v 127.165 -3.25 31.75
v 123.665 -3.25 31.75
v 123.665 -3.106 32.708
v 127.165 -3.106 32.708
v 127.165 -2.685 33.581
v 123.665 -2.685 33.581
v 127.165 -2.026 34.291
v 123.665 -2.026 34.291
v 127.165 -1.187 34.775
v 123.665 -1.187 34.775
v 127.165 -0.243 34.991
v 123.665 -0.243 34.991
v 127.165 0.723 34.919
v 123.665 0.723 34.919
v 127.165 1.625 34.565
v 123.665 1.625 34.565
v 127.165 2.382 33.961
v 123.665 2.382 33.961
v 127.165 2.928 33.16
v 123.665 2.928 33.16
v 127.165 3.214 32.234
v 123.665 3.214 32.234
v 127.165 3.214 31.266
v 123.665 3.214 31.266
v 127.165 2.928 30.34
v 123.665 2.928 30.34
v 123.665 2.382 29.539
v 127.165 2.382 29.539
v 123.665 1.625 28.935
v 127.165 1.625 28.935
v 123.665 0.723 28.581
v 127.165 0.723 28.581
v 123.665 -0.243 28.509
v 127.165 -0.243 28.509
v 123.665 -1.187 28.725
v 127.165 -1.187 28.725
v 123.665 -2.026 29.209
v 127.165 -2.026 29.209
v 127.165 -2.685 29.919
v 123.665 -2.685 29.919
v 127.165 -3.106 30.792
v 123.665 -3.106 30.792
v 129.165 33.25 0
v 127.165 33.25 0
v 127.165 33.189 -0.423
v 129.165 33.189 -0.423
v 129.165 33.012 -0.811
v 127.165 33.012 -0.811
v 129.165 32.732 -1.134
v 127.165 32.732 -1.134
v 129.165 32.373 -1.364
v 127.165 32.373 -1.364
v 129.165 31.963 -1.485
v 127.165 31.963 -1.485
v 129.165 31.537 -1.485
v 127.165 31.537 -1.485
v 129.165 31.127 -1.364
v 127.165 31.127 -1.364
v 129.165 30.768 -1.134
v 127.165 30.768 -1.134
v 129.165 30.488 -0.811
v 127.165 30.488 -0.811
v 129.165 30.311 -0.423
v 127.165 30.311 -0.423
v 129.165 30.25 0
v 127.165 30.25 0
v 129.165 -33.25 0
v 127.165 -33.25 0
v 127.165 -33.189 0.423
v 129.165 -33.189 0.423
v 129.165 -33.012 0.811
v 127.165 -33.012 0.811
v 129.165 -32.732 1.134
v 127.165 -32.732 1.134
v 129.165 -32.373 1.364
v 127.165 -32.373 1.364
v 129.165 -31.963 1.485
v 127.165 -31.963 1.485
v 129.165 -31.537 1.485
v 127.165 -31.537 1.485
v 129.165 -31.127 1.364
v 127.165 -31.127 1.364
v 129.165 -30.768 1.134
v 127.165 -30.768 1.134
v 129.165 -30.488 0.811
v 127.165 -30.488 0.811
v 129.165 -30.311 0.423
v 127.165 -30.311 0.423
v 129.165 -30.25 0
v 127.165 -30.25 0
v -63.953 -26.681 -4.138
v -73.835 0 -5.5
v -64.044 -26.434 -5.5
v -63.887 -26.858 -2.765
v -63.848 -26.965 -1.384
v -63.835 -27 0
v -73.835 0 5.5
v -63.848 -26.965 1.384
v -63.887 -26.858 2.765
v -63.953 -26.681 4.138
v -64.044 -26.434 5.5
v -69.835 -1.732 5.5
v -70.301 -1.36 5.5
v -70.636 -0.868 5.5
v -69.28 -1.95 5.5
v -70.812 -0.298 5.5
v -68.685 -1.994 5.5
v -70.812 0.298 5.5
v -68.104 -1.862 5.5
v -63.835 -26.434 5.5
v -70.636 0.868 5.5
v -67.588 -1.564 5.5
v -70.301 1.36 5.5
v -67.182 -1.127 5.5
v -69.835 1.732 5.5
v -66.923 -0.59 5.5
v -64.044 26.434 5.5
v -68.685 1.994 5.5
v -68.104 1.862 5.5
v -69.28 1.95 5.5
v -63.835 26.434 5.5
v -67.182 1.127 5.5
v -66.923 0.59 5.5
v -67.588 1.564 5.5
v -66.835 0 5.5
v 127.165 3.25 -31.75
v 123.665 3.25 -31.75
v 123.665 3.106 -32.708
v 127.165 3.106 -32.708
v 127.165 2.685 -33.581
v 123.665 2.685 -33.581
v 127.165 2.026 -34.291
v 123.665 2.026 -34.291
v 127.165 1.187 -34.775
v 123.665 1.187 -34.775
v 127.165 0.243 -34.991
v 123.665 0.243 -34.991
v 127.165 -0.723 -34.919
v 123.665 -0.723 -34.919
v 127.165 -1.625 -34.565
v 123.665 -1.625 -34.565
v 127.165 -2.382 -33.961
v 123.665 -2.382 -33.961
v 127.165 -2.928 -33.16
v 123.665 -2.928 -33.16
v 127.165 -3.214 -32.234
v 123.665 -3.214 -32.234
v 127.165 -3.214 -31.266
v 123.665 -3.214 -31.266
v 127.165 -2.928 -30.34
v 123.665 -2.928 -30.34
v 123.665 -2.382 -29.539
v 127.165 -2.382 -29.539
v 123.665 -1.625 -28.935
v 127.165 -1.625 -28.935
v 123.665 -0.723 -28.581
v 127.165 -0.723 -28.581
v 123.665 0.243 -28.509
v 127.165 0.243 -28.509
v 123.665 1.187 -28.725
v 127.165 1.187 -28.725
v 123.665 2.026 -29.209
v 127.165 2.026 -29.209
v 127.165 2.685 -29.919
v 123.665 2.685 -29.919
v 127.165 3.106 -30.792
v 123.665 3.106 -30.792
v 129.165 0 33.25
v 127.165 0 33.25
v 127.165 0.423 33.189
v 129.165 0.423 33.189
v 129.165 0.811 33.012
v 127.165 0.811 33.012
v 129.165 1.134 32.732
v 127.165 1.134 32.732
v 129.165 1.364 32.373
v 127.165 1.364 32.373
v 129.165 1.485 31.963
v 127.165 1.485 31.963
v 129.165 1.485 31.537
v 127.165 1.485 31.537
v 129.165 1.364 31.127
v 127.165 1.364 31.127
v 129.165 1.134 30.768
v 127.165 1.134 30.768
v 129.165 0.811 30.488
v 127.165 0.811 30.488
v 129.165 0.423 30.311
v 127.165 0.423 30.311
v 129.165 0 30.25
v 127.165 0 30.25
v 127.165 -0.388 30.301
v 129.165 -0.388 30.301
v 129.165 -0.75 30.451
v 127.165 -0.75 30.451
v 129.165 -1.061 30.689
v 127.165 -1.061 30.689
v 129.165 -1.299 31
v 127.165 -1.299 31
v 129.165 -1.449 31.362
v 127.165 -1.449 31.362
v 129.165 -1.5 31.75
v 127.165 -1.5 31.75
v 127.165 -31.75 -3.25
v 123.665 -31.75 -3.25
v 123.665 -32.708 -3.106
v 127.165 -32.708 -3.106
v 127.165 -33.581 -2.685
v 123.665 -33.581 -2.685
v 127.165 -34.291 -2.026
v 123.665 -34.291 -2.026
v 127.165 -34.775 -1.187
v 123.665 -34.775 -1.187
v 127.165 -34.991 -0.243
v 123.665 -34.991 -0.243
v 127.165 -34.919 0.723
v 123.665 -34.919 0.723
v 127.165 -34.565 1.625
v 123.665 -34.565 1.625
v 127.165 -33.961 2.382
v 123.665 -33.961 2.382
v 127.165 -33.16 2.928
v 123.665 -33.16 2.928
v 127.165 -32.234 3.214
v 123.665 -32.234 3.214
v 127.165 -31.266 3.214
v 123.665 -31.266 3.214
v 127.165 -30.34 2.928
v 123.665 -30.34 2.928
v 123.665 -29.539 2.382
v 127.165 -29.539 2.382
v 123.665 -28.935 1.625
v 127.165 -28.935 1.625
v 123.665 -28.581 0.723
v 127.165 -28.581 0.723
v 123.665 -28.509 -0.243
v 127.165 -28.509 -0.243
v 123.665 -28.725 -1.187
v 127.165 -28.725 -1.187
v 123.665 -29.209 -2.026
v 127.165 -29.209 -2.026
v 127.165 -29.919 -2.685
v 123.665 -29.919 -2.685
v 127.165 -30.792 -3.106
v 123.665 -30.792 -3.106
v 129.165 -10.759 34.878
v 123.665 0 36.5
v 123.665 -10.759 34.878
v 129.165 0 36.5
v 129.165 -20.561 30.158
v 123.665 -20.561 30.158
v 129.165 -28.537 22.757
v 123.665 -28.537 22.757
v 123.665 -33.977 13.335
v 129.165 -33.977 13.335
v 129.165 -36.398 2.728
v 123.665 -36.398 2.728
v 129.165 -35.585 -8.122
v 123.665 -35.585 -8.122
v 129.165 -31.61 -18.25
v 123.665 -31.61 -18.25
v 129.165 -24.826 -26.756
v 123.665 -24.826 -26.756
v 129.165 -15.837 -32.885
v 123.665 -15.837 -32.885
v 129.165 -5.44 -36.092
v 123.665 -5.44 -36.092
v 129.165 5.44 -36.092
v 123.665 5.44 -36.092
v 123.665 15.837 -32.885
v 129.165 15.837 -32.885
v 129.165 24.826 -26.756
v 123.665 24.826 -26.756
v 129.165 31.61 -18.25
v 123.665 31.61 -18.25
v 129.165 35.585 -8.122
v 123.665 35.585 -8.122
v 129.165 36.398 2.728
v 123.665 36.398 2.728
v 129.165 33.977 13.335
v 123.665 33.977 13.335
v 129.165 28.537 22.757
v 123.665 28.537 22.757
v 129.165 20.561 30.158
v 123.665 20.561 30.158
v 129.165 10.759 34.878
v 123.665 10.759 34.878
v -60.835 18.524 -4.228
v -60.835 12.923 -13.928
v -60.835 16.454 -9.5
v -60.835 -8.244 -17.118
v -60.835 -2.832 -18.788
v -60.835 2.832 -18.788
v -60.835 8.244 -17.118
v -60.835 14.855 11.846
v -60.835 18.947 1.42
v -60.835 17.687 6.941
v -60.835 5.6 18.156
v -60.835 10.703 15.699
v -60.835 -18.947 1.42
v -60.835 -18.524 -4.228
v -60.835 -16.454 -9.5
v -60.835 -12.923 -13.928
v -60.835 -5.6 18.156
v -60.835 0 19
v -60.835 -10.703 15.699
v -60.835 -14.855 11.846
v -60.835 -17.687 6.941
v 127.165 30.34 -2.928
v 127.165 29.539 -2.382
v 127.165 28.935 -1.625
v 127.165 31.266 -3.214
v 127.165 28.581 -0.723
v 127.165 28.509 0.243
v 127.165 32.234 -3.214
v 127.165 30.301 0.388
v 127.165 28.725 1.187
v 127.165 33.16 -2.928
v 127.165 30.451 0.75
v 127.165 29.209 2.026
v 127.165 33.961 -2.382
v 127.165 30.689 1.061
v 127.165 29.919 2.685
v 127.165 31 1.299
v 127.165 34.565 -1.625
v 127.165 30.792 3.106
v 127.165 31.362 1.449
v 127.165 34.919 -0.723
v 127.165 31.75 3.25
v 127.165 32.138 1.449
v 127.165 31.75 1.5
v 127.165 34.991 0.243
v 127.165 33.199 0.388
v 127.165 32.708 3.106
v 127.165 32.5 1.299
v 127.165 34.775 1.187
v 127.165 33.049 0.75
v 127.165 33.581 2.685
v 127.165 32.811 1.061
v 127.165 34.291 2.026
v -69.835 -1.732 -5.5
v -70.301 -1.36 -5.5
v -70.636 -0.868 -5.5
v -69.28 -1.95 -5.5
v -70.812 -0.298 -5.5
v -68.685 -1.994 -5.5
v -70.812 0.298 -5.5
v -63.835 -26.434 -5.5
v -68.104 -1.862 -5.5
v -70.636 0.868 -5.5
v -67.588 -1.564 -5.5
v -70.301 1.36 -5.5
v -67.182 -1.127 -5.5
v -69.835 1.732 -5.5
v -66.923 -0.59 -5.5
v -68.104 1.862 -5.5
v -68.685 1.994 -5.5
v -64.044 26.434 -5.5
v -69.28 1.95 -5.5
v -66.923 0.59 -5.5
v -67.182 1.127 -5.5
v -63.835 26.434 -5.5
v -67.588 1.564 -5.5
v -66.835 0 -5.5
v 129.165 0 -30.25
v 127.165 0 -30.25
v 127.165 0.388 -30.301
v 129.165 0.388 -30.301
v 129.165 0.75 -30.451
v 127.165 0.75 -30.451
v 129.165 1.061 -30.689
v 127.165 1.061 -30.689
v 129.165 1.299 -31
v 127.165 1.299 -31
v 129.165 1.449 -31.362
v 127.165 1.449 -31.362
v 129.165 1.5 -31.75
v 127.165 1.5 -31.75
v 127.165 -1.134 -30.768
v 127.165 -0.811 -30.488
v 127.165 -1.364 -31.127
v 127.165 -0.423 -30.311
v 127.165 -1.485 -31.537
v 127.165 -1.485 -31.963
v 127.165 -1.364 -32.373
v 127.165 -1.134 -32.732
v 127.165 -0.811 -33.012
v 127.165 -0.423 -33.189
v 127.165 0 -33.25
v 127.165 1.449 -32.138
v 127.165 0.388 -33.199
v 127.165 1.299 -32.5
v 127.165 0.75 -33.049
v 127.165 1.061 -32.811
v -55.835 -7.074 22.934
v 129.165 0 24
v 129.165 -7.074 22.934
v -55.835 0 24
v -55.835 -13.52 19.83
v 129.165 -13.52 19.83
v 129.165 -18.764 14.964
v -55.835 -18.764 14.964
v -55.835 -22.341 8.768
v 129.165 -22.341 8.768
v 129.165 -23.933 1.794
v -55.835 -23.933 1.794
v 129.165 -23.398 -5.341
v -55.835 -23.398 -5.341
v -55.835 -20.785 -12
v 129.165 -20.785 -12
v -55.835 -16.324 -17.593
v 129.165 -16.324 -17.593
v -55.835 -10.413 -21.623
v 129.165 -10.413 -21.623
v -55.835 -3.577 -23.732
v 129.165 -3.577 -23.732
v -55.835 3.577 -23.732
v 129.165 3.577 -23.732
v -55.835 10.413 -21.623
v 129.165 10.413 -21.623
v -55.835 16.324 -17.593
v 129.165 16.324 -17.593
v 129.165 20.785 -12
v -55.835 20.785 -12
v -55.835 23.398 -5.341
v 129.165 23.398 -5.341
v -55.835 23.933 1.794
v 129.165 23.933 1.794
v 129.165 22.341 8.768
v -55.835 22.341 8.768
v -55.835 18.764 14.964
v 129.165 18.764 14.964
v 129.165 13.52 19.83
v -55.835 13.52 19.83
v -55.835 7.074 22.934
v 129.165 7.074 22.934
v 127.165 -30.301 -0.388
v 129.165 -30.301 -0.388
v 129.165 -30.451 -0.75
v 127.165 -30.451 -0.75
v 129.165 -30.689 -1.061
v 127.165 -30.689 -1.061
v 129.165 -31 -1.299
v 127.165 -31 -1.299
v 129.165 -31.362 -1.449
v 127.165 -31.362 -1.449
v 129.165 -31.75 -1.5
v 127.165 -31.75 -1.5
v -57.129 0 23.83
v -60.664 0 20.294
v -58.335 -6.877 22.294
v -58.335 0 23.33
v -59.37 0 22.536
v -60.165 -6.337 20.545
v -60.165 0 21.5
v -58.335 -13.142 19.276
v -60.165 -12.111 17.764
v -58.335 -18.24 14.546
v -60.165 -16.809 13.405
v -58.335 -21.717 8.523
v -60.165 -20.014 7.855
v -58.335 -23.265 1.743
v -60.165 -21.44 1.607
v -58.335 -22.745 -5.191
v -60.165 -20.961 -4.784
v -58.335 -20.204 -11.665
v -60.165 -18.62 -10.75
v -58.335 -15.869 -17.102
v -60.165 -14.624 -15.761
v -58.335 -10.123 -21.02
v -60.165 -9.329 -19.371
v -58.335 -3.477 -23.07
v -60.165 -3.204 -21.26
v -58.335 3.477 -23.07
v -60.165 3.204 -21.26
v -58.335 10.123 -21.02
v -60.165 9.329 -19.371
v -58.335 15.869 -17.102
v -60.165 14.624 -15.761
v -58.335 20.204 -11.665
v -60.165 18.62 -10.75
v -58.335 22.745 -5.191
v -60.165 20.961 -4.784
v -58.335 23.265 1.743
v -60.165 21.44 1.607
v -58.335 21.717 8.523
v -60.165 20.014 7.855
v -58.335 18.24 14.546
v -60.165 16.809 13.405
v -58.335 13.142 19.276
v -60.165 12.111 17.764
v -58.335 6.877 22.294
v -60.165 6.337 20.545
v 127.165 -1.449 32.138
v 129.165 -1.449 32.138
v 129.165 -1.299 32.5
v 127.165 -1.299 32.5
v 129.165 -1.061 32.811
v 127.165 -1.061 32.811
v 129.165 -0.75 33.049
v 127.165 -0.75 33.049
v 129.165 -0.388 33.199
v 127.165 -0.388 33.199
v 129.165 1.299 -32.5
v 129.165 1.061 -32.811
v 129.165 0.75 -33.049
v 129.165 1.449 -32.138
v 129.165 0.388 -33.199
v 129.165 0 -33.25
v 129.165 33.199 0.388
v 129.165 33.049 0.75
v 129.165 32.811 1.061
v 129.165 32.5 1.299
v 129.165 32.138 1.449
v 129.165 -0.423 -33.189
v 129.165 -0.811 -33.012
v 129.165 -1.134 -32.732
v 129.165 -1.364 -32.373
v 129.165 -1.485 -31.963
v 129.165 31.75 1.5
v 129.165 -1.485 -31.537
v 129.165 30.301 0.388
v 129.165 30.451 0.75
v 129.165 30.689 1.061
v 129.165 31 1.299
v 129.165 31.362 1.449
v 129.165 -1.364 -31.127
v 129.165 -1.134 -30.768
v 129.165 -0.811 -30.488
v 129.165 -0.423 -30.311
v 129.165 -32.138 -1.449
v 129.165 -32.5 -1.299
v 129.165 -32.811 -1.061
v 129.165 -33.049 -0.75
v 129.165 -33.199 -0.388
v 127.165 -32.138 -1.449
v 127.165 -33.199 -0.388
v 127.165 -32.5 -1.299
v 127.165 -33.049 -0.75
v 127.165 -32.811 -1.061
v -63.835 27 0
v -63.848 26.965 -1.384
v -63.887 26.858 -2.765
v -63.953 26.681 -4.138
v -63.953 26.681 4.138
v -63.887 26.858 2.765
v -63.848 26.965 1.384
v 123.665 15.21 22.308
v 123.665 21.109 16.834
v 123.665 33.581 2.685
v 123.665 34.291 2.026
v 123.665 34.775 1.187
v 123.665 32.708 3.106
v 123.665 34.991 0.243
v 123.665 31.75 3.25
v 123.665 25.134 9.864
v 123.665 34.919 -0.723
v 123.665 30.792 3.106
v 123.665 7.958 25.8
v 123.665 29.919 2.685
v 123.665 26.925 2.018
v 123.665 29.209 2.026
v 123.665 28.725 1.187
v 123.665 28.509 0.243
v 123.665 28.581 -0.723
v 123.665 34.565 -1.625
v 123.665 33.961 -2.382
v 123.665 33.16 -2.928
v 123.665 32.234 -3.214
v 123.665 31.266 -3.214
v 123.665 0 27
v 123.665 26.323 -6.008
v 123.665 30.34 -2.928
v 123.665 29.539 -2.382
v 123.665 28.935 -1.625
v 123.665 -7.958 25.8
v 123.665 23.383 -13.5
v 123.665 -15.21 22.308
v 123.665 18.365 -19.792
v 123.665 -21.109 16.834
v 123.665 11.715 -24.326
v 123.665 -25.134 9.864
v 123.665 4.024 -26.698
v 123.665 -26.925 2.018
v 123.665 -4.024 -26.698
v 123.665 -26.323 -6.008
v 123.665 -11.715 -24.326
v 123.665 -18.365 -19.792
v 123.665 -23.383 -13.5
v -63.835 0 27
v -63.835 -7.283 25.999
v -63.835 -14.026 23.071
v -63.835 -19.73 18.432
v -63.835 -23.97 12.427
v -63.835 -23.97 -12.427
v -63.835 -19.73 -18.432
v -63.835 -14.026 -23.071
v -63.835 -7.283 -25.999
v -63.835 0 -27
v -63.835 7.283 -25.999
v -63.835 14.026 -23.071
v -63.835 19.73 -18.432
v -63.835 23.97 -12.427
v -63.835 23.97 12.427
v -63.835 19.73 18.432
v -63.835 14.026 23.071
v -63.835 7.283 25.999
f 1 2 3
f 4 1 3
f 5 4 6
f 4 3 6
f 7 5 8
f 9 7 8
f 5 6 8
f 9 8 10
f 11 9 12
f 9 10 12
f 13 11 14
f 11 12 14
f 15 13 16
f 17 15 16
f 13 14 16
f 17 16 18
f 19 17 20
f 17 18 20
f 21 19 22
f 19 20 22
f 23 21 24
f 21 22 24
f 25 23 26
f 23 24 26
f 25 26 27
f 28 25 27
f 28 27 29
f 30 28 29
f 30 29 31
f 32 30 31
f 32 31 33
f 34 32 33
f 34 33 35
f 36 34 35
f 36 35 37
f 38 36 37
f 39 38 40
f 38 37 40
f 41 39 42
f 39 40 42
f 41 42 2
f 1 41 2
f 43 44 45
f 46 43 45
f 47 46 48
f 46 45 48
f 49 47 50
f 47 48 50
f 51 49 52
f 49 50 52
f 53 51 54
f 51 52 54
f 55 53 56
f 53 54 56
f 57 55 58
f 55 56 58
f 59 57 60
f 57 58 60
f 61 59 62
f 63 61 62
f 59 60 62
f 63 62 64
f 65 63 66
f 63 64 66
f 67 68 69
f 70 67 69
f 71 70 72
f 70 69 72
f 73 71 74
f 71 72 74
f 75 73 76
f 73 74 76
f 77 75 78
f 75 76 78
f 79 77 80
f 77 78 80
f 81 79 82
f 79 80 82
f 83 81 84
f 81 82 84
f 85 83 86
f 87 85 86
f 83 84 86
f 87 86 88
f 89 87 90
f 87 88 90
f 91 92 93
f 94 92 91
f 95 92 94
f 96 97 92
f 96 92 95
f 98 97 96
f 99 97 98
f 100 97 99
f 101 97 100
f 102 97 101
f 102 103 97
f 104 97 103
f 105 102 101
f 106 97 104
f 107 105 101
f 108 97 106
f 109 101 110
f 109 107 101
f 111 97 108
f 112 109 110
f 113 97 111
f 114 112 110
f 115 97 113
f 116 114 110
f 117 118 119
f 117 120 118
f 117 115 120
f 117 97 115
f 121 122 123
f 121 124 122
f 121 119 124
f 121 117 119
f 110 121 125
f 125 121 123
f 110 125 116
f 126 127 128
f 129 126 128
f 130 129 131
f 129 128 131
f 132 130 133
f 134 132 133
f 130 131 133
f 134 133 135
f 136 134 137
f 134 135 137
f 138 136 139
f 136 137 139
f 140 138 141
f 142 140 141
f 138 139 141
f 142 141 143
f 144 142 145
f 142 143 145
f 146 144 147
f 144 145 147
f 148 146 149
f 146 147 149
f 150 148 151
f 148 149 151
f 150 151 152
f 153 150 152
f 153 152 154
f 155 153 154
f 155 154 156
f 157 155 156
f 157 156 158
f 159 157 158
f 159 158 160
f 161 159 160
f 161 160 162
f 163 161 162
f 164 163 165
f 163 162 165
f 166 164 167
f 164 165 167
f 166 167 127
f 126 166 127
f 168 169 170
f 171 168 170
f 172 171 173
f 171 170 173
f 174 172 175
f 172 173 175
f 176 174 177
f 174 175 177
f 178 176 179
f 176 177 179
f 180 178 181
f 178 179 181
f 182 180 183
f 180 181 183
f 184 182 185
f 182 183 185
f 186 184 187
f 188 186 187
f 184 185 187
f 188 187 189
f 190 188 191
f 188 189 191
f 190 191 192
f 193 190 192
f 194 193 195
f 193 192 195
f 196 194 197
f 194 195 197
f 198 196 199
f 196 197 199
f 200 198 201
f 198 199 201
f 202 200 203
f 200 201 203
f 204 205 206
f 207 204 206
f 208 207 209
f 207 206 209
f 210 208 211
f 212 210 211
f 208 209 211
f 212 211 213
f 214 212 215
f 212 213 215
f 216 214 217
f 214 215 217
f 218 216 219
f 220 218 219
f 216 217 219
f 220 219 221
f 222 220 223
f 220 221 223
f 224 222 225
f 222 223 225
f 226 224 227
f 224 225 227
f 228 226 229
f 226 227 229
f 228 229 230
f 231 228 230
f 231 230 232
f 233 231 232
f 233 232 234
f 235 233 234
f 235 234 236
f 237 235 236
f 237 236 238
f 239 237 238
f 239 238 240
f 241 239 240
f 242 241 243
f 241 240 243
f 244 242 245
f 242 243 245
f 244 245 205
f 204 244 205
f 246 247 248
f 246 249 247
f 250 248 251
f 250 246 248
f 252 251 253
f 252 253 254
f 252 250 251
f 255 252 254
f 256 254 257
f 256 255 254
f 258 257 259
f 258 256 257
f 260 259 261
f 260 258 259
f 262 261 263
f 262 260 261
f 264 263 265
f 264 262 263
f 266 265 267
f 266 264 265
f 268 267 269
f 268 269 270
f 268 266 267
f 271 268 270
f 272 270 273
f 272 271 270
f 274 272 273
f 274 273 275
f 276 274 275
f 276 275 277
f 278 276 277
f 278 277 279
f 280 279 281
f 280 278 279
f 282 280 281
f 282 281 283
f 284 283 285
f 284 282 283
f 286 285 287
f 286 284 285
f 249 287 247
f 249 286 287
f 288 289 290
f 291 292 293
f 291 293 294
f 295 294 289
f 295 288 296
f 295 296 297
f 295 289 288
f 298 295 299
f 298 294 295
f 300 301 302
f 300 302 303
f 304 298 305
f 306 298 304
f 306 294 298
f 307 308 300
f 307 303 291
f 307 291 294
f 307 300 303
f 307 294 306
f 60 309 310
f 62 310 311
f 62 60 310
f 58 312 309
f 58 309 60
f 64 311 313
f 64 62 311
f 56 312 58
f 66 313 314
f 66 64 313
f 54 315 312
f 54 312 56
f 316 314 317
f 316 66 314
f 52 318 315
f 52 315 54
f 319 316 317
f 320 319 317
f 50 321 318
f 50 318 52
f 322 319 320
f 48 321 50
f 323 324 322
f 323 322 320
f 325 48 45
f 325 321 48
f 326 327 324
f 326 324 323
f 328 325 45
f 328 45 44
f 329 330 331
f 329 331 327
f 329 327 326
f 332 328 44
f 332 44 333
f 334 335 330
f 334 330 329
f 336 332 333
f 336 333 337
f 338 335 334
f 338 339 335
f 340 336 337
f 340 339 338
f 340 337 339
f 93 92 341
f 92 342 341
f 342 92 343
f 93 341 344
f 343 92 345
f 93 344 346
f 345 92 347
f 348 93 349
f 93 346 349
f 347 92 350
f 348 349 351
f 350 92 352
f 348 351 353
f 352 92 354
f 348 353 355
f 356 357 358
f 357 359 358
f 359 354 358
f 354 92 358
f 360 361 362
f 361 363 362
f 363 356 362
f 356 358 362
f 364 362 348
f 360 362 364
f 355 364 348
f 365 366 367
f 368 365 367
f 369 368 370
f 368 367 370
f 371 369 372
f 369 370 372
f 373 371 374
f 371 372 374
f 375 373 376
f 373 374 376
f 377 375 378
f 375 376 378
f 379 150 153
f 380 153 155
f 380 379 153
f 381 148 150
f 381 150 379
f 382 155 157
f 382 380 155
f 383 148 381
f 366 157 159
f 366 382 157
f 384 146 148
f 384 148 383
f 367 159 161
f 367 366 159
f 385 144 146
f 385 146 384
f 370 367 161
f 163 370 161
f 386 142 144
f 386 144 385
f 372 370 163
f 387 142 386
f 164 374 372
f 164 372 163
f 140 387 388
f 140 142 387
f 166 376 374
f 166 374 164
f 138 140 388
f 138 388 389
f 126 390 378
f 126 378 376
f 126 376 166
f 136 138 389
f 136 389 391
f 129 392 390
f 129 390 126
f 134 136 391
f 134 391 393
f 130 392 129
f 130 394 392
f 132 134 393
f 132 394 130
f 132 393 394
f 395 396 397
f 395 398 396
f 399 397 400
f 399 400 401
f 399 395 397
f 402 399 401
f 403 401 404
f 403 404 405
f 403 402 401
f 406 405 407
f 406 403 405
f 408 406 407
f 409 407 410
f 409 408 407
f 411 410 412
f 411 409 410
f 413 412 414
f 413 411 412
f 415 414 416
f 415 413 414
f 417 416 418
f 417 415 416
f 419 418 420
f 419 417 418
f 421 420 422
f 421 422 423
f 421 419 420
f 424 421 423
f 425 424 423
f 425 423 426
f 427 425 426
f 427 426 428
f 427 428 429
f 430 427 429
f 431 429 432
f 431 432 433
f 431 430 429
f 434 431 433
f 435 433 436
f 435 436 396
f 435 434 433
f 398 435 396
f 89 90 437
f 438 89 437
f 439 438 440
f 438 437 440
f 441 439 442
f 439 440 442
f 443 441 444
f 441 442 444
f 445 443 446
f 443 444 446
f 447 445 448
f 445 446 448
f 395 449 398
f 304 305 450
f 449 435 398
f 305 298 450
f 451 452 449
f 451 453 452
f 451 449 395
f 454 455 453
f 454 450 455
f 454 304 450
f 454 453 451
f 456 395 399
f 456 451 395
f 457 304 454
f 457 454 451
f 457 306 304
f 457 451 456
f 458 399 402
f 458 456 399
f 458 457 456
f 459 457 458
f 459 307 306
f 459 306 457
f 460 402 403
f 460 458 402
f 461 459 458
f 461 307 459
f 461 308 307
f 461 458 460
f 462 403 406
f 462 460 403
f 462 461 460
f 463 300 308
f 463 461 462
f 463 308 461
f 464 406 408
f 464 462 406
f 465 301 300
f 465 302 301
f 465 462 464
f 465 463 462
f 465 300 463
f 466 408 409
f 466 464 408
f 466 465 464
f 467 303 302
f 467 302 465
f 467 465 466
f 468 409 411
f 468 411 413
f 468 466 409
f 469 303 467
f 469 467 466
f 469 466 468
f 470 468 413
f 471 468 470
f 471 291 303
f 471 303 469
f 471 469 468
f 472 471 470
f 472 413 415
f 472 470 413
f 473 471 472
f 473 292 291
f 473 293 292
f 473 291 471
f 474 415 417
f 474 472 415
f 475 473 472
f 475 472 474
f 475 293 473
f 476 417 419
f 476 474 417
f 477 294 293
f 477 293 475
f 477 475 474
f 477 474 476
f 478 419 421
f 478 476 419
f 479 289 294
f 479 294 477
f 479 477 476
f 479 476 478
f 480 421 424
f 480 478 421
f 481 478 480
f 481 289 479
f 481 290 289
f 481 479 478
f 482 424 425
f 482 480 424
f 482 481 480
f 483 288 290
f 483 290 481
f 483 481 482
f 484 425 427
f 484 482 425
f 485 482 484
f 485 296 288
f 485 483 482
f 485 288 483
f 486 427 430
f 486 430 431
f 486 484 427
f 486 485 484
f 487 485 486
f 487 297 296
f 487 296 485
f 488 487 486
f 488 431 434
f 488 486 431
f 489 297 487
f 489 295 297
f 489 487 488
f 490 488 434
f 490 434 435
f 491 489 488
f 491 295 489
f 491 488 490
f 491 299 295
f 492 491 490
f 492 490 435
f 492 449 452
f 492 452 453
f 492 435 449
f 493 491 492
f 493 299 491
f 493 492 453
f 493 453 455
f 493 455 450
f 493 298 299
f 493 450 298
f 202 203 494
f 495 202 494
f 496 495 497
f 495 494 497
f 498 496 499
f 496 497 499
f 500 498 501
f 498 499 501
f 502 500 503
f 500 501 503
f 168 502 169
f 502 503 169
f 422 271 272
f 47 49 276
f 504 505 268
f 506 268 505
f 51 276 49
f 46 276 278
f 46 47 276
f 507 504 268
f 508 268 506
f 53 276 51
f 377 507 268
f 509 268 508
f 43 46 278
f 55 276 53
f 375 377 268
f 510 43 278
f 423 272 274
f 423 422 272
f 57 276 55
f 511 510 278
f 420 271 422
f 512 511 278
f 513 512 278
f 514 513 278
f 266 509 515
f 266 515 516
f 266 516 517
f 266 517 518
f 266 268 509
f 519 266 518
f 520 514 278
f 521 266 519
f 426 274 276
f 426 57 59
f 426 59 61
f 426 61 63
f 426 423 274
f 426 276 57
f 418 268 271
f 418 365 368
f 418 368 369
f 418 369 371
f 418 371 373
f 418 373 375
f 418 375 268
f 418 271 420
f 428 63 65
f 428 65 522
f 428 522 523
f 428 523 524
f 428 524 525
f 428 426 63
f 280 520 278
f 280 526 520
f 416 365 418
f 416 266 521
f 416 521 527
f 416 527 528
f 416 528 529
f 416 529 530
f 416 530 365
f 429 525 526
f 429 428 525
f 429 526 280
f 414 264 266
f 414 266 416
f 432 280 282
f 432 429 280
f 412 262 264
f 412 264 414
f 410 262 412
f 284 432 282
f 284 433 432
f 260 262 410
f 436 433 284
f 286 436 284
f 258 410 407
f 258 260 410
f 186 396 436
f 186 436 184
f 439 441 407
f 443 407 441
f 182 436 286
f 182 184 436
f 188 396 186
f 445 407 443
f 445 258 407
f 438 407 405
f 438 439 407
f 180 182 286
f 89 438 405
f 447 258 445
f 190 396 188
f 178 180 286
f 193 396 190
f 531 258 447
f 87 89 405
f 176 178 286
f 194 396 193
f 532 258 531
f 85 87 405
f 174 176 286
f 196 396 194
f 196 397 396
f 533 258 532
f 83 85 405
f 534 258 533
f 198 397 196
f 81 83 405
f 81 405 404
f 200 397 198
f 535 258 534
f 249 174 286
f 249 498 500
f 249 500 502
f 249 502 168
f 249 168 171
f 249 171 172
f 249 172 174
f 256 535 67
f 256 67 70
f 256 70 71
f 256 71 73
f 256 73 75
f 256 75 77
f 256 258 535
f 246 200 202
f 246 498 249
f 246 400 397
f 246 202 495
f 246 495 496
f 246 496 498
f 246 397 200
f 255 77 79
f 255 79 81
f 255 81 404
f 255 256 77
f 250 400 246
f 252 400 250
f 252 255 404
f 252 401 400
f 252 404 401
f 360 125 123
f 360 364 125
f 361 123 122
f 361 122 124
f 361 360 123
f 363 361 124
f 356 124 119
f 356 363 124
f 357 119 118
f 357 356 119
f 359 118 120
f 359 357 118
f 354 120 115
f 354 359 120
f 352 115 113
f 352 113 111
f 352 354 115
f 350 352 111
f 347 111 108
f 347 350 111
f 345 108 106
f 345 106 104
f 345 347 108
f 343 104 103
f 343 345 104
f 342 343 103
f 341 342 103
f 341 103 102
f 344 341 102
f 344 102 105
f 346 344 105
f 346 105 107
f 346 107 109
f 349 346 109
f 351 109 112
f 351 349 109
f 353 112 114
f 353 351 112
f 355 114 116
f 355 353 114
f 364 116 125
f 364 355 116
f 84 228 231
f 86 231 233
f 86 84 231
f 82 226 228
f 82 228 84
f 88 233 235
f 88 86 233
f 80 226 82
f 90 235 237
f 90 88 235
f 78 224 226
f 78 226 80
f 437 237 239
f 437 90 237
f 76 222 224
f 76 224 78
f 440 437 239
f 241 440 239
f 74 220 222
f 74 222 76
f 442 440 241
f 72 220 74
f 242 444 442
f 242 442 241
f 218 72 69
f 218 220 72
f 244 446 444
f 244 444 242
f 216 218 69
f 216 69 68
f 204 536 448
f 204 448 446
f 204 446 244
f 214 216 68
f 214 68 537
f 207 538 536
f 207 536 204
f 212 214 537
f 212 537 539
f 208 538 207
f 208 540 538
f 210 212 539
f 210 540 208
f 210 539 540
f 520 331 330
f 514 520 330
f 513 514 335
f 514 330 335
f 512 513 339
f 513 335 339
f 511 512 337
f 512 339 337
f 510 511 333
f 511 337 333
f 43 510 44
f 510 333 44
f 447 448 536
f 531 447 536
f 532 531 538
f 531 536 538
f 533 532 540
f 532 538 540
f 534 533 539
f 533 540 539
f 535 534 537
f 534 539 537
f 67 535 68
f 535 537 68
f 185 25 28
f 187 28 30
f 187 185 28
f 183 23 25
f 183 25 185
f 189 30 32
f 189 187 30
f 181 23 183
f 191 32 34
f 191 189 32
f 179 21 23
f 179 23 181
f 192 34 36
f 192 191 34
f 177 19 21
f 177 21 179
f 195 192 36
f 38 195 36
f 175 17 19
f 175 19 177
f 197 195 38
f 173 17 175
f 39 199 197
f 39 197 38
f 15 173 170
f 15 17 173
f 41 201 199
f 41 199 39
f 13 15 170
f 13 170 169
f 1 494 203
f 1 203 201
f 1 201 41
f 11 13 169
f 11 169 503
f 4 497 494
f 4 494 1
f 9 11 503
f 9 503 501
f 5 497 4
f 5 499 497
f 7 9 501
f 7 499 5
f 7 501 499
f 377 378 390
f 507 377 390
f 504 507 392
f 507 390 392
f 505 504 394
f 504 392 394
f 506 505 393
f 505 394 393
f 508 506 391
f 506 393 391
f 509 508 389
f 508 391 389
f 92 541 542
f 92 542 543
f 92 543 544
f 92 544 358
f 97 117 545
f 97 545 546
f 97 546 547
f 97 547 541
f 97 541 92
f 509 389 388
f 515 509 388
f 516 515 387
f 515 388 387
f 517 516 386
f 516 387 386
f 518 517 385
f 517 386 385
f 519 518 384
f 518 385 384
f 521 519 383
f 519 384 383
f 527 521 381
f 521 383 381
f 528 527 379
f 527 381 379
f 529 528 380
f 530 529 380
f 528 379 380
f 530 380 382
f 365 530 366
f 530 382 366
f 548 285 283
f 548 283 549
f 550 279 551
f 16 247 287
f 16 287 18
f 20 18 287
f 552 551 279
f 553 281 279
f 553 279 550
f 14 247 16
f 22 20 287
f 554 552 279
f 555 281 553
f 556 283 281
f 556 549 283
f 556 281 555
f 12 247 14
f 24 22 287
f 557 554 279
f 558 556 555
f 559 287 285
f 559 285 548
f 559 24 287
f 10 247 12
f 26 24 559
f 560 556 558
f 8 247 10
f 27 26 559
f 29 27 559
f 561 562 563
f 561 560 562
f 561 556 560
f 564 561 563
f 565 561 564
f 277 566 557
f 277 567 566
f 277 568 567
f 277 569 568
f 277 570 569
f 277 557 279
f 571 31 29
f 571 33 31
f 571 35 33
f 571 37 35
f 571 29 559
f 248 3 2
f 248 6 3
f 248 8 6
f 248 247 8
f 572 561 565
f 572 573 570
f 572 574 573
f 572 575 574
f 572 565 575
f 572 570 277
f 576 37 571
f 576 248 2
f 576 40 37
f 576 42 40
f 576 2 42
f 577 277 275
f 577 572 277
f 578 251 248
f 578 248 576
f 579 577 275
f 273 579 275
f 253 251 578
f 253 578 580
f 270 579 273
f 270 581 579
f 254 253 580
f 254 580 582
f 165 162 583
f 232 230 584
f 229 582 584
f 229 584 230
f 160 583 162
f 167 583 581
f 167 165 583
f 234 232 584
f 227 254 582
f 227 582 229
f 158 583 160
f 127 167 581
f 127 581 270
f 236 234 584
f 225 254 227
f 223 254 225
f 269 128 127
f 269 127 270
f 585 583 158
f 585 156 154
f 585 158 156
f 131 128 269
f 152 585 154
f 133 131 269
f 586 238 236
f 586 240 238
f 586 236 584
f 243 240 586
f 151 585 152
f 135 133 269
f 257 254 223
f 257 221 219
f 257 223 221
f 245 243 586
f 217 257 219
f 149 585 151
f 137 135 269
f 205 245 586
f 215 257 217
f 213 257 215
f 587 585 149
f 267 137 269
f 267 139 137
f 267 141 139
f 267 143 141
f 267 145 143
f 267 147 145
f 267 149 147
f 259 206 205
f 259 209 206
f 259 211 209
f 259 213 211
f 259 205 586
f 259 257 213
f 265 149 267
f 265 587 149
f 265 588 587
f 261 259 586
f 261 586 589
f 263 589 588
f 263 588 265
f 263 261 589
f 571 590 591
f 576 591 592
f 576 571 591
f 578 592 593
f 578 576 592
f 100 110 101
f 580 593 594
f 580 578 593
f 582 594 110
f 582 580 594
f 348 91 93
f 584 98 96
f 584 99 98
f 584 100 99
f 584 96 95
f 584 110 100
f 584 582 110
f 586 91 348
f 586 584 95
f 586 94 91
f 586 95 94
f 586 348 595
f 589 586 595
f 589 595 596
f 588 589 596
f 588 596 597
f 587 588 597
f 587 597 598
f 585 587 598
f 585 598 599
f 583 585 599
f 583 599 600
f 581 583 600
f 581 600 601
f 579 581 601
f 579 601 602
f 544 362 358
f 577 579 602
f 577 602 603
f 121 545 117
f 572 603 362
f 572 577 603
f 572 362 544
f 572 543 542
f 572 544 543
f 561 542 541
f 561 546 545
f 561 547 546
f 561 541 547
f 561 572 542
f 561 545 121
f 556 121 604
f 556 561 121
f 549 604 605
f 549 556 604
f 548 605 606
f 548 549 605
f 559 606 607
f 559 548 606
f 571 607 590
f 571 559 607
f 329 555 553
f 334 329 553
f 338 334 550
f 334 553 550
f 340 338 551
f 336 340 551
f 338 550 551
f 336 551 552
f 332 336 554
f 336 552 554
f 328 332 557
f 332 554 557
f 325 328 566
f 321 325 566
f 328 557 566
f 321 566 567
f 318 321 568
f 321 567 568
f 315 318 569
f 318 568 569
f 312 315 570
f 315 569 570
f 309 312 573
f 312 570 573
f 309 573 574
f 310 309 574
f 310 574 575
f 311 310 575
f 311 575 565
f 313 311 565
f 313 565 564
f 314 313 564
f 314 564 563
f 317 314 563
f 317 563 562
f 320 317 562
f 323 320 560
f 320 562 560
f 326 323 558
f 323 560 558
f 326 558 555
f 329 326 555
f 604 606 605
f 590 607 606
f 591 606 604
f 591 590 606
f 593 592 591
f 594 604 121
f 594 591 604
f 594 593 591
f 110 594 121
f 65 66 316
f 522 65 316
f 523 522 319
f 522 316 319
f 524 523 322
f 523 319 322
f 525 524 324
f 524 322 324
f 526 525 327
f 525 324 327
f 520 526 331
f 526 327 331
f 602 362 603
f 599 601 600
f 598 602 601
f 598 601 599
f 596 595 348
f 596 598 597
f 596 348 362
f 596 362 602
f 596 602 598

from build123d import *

# Parameters (mm, degrees)
ESBO_O2_R                = 2
RESSALTO_EXTRUS_O1_DEPTH = 5.5
ESBO_O3_R                = 33.530734639
ESBO_O3_R_2              = 27
CORTE_EXTRUS_O1_DEPTH    = 11
ESBO_O4_R                = 3.25
CORTE_EXTRUS_O3_DEPTH    = 3.5
CORTE_EXTRUS_O4_DEPTH    = 205.13414707
PADR_OCIRCULAR7_COUNT    = 4


with BuildPart() as part:
    # Esboço1 → revolução (revolve)
    with BuildSketch(Plane.XY, mode=Mode.PRIVATE) as revolu_o_sk:
        with BuildLine():
            Line((-63.834530413, 0), (-63.834530413, 27))
            Line((-63.834530413, 27), (123.665469587, 27))
            Line((123.665469587, 27), (123.665469587, 36.5))
            Line((123.665469587, 36.5), (129.165469587, 36.5))
            Line((129.165469587, 36.5), (129.165469587, 24))
            Line((129.165469587, 24), (-55.834512047, 24))
            ThreePointArc((-55.834512047, 24), (-59.370057826, 22.535540399), (-60.834530413, 19))
            Line((-60.834530413, 19), (-60.834530413, 0))
            Line((-60.834530413, 0), (-63.834530413, 0))
        make_face()
    revolve(revolu_o_sk.sketch.rotate(Axis((-88.99, 0, 0), (1, 0, 0)), 90), axis=Axis((-88.99, 0, 0), (1, 0, 0)))

    # Esboço4 → Corte-extrusão3 (cut)
    with BuildSketch(Plane.ZY.offset(-123.665469587)):
        with Locations((0, 31.75)):
            Circle(ESBO_O4_R)
    corte_extrus_o3 = extrude(amount=-CORTE_EXTRUS_O3_DEPTH, mode=Mode.SUBTRACT)

    # Esboço4<3> → Corte-extrusão4 (cut, through all)
    with BuildSketch(Plane.ZY.offset(-123.665469587)):
        with BuildLine():
            ThreePointArc((0, 33.25), (-1.5, 31.75), (0, 30.25))
            Line((0, 30.25), (0, 33.25))
        make_face()
        with BuildLine():
            Line((0, 33.25), (0, 30.25))
            ThreePointArc((0, 30.25), (1.060660172, 30.689339828), (1.5, 31.75))
            ThreePointArc((1.5, 31.75), (1.060660172, 32.810660172), (0, 33.25))
        make_face()
    corte_extrus_o4 = extrude(amount=-CORTE_EXTRUS_O4_DEPTH, mode=Mode.SUBTRACT)

    # PadrãoCircular7: Corte-extrusão3, Corte-extrusão4 ×4 about axis
    padr_ocircular7_axis = Axis((0, 0, 0), (1, 0, 0))
    add([corte_extrus_o3.rotate(padr_ocircular7_axis, i * 360 / PADR_OCIRCULAR7_COUNT) for i in range(1, PADR_OCIRCULAR7_COUNT)], mode=Mode.SUBTRACT)
    add([corte_extrus_o4.rotate(padr_ocircular7_axis, i * 360 / PADR_OCIRCULAR7_COUNT) for i in range(1, PADR_OCIRCULAR7_COUNT)], mode=Mode.SUBTRACT)


with BuildPart() as body_2:
    # Esboço2 → Ressalto-extrusão1 (new, symmetric)
    with BuildSketch(Plane.XY):
        Polygon((-63.834530413, 27), (-73.834530413, 0), (-63.834530413, -27), align=None)
        with Locations((-68.834530413, 0)):
            Circle(ESBO_O2_R, mode=Mode.SUBTRACT)
    extrude(amount=RESSALTO_EXTRUS_O1_DEPTH, both=True)

    # Esboço3 → Corte-extrusão1 (cut)
    with BuildSketch(Plane.ZY.offset(63.834530413)):
        Circle(ESBO_O3_R)
        Circle(ESBO_O3_R_2, mode=Mode.SUBTRACT)
    extrude(amount=CORTE_EXTRUS_O1_DEPTH, mode=Mode.SUBTRACT)


with BuildPart() as part_1:
    add(part.part)

    # Combinar1: union body 2
    add(body_2.part)


solid = part_1.part
